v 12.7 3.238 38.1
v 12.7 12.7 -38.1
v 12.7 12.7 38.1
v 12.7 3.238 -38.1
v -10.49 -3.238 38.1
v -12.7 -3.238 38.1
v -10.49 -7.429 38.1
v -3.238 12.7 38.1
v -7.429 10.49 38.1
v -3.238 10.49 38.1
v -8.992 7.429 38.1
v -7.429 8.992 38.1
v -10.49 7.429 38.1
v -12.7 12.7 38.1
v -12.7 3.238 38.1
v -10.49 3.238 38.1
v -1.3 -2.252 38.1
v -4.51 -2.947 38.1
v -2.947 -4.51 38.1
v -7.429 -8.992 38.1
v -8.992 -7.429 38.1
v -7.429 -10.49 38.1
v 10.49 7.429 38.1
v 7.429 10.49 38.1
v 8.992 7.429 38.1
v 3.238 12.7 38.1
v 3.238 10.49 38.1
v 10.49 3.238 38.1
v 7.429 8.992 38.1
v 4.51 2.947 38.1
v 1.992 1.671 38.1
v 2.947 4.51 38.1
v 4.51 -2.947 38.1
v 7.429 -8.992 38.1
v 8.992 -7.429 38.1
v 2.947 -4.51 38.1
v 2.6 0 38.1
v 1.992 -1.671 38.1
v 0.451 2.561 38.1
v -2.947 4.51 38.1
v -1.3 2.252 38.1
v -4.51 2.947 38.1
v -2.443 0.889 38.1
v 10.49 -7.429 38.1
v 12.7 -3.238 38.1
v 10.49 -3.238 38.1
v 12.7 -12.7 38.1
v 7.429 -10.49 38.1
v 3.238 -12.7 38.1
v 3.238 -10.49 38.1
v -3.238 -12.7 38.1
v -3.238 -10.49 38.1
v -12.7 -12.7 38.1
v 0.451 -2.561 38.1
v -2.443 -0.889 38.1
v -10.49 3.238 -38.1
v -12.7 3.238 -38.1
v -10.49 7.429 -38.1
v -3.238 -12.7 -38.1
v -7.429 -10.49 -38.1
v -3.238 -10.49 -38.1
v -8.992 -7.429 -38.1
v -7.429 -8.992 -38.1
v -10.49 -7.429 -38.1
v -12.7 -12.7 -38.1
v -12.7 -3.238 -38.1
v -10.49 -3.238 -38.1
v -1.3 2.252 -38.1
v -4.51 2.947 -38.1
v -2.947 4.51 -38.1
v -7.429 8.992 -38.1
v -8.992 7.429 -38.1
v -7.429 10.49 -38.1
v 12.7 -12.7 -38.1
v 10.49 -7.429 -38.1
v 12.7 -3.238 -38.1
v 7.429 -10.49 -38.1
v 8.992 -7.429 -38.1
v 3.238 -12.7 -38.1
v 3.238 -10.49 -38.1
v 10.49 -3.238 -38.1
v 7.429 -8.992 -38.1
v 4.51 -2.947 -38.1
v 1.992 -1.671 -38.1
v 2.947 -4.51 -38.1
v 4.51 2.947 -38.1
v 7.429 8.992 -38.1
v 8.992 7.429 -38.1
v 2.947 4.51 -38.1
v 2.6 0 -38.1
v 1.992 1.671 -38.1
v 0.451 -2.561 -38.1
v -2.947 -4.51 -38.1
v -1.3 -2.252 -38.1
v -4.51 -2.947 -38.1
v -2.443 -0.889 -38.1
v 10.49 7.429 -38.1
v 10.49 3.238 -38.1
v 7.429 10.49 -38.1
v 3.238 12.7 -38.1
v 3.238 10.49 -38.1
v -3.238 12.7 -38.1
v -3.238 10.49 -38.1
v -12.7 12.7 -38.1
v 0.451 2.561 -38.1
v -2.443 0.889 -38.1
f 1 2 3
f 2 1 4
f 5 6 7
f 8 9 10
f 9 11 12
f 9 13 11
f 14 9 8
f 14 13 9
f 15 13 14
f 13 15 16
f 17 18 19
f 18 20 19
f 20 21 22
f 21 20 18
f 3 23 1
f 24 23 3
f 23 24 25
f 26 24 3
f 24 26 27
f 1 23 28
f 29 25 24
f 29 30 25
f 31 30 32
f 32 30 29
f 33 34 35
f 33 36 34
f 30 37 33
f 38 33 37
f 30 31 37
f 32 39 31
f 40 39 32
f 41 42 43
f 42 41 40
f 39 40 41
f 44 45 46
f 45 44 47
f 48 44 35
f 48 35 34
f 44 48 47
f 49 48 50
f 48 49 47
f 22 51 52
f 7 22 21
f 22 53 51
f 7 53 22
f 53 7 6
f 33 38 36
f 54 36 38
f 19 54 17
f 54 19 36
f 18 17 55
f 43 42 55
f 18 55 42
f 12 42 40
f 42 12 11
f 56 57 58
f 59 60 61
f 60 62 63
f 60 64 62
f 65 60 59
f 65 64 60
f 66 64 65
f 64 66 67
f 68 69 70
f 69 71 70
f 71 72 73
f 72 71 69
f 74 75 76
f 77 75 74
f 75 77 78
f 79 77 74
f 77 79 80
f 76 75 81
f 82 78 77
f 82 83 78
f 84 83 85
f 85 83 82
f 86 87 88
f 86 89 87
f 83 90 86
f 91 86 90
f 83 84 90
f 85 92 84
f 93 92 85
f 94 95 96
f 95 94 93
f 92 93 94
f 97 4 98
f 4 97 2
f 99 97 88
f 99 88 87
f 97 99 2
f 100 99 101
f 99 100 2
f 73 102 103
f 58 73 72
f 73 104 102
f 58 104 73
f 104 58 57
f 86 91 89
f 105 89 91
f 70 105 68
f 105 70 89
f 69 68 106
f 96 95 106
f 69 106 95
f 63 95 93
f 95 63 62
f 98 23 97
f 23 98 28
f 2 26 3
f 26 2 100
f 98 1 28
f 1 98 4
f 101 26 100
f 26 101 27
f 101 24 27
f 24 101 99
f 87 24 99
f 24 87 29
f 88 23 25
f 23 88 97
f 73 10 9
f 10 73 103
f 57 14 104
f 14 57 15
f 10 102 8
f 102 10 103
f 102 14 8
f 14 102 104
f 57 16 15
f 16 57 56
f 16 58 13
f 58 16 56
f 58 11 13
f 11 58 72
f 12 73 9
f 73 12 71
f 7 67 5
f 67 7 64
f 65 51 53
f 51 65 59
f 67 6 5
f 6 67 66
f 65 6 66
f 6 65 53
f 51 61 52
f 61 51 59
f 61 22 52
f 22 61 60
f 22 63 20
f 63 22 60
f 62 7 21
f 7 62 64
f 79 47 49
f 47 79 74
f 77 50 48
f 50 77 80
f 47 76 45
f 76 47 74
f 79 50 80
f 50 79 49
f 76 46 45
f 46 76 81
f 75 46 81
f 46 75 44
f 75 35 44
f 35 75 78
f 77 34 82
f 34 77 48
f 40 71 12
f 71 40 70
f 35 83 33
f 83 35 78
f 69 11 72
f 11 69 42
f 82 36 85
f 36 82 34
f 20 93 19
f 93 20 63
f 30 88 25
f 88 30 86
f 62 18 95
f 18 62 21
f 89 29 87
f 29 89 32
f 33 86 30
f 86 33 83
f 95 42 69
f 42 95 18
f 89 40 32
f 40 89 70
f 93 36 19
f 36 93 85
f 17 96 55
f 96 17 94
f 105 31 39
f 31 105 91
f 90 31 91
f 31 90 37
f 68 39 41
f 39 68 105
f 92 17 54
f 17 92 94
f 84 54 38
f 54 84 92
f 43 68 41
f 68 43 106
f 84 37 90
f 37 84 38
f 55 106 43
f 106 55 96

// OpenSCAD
// file: conf_extrusions.scad
// extrusion parameters
// width=0
// slot_width=1
// slot_inner_width=2
// thin_wall=3
// center_square=4
// hole_dia=5

//************* extrusion access functions *************
function extrusion_width(type)  = type[0];
function extrusion_slot_width(type)  = type[1];
function extrusion_slot_inner_width(type)  = type[2];
function extrusion_thin_wall(type) = type[3];
function extrusion_center_square(type) = type[4];
function extrusion_hole_dia(type) = type[5];
function extrusion_corner_square_width(type) = (extrusion_width(type)-extrusion_slot_inner_width(type))/2;
function extrusion_wall_width(type)=(extrusion_width(type)-extrusion_slot_width(type))/2;

// 10 series 8020 (inch)
conf_ex_8020_10s = [25.4, 6.477, 14.859, 2.21, 9.02, 5.2];

// 15 series 8020 (inch)
conf_ex_8020_15s = [38.1, 8.128, 20.574, 2.21, 13.487, 6.655];

// 20 series 8020
conf_ex_8020_20s = [20, 5.26, 11.99, 1.5, 7.31, 4.19];

// 25 series 8020
conf_ex_8020_25s = [25, 6.5, 14.86, 2.14, 8.1, 5];

// 30 series 8020
conf_ex_8020_30s = [30, 8.13, 16.5, 2.55, 11.67, 6.5];

// Misumi 2020
conf_ex_misumi_2020 = [20, 6, 12, 2, 8, 4.2];
// main file
include <conf_extrusions.scad>

module extrusion(type=conf_ex_8020_10s, length=10, center=true) {
	difference() {
		color("silver") render(convexity = 8) union(){
			for (i=[0:3]) {
	           	rotate([0, 0, 90*i]) translate([extrusion_width(type)/2-extrusion_thin_wall(type)/2, extrusion_width(type)/2-extrusion_wall_width(type)/2, 0]) cube([extrusion_thin_wall(type),extrusion_wall_width(type),length], center = center);
				rotate([0, 0, 90*i]) translate([extrusion_width(type)/2-extrusion_wall_width(type)/2, extrusion_width(type)/2-extrusion_thin_wall(type)/2, 0]) cube([extrusion_wall_width(type),extrusion_thin_wall(type),length], center = center);
				rotate([0, 0, 90*i]) translate([extrusion_width(type)/2-extrusion_corner_square_width(type)/2, extrusion_width(type)/2-extrusion_corner_square_width(type)/2, 0]) cube([extrusion_corner_square_width(type),extrusion_corner_square_width(type),length], center = center);
			}
				rotate([0, 0, 45]) cube([extrusion_thin_wall(type),(extrusion_width(type)-(sin(45)*extrusion_thin_wall(type)))/cos(45),length], center = center);
				rotate([0, 0, -45]) cube([extrusion_thin_wall(type),(extrusion_width(type)-(sin(45)*extrusion_thin_wall(type)))/cos(45),length], center = center);
				cube([extrusion_center_square(type),extrusion_center_square(type),length], center = center);
			}
			cylinder(h=length+1,r=extrusion_hole_dia(type)/2,center=center);
		}
}

extrusion(type=conf_ex_8020_10s, length=extrusion_width(conf_ex_8020_10s)*3);
